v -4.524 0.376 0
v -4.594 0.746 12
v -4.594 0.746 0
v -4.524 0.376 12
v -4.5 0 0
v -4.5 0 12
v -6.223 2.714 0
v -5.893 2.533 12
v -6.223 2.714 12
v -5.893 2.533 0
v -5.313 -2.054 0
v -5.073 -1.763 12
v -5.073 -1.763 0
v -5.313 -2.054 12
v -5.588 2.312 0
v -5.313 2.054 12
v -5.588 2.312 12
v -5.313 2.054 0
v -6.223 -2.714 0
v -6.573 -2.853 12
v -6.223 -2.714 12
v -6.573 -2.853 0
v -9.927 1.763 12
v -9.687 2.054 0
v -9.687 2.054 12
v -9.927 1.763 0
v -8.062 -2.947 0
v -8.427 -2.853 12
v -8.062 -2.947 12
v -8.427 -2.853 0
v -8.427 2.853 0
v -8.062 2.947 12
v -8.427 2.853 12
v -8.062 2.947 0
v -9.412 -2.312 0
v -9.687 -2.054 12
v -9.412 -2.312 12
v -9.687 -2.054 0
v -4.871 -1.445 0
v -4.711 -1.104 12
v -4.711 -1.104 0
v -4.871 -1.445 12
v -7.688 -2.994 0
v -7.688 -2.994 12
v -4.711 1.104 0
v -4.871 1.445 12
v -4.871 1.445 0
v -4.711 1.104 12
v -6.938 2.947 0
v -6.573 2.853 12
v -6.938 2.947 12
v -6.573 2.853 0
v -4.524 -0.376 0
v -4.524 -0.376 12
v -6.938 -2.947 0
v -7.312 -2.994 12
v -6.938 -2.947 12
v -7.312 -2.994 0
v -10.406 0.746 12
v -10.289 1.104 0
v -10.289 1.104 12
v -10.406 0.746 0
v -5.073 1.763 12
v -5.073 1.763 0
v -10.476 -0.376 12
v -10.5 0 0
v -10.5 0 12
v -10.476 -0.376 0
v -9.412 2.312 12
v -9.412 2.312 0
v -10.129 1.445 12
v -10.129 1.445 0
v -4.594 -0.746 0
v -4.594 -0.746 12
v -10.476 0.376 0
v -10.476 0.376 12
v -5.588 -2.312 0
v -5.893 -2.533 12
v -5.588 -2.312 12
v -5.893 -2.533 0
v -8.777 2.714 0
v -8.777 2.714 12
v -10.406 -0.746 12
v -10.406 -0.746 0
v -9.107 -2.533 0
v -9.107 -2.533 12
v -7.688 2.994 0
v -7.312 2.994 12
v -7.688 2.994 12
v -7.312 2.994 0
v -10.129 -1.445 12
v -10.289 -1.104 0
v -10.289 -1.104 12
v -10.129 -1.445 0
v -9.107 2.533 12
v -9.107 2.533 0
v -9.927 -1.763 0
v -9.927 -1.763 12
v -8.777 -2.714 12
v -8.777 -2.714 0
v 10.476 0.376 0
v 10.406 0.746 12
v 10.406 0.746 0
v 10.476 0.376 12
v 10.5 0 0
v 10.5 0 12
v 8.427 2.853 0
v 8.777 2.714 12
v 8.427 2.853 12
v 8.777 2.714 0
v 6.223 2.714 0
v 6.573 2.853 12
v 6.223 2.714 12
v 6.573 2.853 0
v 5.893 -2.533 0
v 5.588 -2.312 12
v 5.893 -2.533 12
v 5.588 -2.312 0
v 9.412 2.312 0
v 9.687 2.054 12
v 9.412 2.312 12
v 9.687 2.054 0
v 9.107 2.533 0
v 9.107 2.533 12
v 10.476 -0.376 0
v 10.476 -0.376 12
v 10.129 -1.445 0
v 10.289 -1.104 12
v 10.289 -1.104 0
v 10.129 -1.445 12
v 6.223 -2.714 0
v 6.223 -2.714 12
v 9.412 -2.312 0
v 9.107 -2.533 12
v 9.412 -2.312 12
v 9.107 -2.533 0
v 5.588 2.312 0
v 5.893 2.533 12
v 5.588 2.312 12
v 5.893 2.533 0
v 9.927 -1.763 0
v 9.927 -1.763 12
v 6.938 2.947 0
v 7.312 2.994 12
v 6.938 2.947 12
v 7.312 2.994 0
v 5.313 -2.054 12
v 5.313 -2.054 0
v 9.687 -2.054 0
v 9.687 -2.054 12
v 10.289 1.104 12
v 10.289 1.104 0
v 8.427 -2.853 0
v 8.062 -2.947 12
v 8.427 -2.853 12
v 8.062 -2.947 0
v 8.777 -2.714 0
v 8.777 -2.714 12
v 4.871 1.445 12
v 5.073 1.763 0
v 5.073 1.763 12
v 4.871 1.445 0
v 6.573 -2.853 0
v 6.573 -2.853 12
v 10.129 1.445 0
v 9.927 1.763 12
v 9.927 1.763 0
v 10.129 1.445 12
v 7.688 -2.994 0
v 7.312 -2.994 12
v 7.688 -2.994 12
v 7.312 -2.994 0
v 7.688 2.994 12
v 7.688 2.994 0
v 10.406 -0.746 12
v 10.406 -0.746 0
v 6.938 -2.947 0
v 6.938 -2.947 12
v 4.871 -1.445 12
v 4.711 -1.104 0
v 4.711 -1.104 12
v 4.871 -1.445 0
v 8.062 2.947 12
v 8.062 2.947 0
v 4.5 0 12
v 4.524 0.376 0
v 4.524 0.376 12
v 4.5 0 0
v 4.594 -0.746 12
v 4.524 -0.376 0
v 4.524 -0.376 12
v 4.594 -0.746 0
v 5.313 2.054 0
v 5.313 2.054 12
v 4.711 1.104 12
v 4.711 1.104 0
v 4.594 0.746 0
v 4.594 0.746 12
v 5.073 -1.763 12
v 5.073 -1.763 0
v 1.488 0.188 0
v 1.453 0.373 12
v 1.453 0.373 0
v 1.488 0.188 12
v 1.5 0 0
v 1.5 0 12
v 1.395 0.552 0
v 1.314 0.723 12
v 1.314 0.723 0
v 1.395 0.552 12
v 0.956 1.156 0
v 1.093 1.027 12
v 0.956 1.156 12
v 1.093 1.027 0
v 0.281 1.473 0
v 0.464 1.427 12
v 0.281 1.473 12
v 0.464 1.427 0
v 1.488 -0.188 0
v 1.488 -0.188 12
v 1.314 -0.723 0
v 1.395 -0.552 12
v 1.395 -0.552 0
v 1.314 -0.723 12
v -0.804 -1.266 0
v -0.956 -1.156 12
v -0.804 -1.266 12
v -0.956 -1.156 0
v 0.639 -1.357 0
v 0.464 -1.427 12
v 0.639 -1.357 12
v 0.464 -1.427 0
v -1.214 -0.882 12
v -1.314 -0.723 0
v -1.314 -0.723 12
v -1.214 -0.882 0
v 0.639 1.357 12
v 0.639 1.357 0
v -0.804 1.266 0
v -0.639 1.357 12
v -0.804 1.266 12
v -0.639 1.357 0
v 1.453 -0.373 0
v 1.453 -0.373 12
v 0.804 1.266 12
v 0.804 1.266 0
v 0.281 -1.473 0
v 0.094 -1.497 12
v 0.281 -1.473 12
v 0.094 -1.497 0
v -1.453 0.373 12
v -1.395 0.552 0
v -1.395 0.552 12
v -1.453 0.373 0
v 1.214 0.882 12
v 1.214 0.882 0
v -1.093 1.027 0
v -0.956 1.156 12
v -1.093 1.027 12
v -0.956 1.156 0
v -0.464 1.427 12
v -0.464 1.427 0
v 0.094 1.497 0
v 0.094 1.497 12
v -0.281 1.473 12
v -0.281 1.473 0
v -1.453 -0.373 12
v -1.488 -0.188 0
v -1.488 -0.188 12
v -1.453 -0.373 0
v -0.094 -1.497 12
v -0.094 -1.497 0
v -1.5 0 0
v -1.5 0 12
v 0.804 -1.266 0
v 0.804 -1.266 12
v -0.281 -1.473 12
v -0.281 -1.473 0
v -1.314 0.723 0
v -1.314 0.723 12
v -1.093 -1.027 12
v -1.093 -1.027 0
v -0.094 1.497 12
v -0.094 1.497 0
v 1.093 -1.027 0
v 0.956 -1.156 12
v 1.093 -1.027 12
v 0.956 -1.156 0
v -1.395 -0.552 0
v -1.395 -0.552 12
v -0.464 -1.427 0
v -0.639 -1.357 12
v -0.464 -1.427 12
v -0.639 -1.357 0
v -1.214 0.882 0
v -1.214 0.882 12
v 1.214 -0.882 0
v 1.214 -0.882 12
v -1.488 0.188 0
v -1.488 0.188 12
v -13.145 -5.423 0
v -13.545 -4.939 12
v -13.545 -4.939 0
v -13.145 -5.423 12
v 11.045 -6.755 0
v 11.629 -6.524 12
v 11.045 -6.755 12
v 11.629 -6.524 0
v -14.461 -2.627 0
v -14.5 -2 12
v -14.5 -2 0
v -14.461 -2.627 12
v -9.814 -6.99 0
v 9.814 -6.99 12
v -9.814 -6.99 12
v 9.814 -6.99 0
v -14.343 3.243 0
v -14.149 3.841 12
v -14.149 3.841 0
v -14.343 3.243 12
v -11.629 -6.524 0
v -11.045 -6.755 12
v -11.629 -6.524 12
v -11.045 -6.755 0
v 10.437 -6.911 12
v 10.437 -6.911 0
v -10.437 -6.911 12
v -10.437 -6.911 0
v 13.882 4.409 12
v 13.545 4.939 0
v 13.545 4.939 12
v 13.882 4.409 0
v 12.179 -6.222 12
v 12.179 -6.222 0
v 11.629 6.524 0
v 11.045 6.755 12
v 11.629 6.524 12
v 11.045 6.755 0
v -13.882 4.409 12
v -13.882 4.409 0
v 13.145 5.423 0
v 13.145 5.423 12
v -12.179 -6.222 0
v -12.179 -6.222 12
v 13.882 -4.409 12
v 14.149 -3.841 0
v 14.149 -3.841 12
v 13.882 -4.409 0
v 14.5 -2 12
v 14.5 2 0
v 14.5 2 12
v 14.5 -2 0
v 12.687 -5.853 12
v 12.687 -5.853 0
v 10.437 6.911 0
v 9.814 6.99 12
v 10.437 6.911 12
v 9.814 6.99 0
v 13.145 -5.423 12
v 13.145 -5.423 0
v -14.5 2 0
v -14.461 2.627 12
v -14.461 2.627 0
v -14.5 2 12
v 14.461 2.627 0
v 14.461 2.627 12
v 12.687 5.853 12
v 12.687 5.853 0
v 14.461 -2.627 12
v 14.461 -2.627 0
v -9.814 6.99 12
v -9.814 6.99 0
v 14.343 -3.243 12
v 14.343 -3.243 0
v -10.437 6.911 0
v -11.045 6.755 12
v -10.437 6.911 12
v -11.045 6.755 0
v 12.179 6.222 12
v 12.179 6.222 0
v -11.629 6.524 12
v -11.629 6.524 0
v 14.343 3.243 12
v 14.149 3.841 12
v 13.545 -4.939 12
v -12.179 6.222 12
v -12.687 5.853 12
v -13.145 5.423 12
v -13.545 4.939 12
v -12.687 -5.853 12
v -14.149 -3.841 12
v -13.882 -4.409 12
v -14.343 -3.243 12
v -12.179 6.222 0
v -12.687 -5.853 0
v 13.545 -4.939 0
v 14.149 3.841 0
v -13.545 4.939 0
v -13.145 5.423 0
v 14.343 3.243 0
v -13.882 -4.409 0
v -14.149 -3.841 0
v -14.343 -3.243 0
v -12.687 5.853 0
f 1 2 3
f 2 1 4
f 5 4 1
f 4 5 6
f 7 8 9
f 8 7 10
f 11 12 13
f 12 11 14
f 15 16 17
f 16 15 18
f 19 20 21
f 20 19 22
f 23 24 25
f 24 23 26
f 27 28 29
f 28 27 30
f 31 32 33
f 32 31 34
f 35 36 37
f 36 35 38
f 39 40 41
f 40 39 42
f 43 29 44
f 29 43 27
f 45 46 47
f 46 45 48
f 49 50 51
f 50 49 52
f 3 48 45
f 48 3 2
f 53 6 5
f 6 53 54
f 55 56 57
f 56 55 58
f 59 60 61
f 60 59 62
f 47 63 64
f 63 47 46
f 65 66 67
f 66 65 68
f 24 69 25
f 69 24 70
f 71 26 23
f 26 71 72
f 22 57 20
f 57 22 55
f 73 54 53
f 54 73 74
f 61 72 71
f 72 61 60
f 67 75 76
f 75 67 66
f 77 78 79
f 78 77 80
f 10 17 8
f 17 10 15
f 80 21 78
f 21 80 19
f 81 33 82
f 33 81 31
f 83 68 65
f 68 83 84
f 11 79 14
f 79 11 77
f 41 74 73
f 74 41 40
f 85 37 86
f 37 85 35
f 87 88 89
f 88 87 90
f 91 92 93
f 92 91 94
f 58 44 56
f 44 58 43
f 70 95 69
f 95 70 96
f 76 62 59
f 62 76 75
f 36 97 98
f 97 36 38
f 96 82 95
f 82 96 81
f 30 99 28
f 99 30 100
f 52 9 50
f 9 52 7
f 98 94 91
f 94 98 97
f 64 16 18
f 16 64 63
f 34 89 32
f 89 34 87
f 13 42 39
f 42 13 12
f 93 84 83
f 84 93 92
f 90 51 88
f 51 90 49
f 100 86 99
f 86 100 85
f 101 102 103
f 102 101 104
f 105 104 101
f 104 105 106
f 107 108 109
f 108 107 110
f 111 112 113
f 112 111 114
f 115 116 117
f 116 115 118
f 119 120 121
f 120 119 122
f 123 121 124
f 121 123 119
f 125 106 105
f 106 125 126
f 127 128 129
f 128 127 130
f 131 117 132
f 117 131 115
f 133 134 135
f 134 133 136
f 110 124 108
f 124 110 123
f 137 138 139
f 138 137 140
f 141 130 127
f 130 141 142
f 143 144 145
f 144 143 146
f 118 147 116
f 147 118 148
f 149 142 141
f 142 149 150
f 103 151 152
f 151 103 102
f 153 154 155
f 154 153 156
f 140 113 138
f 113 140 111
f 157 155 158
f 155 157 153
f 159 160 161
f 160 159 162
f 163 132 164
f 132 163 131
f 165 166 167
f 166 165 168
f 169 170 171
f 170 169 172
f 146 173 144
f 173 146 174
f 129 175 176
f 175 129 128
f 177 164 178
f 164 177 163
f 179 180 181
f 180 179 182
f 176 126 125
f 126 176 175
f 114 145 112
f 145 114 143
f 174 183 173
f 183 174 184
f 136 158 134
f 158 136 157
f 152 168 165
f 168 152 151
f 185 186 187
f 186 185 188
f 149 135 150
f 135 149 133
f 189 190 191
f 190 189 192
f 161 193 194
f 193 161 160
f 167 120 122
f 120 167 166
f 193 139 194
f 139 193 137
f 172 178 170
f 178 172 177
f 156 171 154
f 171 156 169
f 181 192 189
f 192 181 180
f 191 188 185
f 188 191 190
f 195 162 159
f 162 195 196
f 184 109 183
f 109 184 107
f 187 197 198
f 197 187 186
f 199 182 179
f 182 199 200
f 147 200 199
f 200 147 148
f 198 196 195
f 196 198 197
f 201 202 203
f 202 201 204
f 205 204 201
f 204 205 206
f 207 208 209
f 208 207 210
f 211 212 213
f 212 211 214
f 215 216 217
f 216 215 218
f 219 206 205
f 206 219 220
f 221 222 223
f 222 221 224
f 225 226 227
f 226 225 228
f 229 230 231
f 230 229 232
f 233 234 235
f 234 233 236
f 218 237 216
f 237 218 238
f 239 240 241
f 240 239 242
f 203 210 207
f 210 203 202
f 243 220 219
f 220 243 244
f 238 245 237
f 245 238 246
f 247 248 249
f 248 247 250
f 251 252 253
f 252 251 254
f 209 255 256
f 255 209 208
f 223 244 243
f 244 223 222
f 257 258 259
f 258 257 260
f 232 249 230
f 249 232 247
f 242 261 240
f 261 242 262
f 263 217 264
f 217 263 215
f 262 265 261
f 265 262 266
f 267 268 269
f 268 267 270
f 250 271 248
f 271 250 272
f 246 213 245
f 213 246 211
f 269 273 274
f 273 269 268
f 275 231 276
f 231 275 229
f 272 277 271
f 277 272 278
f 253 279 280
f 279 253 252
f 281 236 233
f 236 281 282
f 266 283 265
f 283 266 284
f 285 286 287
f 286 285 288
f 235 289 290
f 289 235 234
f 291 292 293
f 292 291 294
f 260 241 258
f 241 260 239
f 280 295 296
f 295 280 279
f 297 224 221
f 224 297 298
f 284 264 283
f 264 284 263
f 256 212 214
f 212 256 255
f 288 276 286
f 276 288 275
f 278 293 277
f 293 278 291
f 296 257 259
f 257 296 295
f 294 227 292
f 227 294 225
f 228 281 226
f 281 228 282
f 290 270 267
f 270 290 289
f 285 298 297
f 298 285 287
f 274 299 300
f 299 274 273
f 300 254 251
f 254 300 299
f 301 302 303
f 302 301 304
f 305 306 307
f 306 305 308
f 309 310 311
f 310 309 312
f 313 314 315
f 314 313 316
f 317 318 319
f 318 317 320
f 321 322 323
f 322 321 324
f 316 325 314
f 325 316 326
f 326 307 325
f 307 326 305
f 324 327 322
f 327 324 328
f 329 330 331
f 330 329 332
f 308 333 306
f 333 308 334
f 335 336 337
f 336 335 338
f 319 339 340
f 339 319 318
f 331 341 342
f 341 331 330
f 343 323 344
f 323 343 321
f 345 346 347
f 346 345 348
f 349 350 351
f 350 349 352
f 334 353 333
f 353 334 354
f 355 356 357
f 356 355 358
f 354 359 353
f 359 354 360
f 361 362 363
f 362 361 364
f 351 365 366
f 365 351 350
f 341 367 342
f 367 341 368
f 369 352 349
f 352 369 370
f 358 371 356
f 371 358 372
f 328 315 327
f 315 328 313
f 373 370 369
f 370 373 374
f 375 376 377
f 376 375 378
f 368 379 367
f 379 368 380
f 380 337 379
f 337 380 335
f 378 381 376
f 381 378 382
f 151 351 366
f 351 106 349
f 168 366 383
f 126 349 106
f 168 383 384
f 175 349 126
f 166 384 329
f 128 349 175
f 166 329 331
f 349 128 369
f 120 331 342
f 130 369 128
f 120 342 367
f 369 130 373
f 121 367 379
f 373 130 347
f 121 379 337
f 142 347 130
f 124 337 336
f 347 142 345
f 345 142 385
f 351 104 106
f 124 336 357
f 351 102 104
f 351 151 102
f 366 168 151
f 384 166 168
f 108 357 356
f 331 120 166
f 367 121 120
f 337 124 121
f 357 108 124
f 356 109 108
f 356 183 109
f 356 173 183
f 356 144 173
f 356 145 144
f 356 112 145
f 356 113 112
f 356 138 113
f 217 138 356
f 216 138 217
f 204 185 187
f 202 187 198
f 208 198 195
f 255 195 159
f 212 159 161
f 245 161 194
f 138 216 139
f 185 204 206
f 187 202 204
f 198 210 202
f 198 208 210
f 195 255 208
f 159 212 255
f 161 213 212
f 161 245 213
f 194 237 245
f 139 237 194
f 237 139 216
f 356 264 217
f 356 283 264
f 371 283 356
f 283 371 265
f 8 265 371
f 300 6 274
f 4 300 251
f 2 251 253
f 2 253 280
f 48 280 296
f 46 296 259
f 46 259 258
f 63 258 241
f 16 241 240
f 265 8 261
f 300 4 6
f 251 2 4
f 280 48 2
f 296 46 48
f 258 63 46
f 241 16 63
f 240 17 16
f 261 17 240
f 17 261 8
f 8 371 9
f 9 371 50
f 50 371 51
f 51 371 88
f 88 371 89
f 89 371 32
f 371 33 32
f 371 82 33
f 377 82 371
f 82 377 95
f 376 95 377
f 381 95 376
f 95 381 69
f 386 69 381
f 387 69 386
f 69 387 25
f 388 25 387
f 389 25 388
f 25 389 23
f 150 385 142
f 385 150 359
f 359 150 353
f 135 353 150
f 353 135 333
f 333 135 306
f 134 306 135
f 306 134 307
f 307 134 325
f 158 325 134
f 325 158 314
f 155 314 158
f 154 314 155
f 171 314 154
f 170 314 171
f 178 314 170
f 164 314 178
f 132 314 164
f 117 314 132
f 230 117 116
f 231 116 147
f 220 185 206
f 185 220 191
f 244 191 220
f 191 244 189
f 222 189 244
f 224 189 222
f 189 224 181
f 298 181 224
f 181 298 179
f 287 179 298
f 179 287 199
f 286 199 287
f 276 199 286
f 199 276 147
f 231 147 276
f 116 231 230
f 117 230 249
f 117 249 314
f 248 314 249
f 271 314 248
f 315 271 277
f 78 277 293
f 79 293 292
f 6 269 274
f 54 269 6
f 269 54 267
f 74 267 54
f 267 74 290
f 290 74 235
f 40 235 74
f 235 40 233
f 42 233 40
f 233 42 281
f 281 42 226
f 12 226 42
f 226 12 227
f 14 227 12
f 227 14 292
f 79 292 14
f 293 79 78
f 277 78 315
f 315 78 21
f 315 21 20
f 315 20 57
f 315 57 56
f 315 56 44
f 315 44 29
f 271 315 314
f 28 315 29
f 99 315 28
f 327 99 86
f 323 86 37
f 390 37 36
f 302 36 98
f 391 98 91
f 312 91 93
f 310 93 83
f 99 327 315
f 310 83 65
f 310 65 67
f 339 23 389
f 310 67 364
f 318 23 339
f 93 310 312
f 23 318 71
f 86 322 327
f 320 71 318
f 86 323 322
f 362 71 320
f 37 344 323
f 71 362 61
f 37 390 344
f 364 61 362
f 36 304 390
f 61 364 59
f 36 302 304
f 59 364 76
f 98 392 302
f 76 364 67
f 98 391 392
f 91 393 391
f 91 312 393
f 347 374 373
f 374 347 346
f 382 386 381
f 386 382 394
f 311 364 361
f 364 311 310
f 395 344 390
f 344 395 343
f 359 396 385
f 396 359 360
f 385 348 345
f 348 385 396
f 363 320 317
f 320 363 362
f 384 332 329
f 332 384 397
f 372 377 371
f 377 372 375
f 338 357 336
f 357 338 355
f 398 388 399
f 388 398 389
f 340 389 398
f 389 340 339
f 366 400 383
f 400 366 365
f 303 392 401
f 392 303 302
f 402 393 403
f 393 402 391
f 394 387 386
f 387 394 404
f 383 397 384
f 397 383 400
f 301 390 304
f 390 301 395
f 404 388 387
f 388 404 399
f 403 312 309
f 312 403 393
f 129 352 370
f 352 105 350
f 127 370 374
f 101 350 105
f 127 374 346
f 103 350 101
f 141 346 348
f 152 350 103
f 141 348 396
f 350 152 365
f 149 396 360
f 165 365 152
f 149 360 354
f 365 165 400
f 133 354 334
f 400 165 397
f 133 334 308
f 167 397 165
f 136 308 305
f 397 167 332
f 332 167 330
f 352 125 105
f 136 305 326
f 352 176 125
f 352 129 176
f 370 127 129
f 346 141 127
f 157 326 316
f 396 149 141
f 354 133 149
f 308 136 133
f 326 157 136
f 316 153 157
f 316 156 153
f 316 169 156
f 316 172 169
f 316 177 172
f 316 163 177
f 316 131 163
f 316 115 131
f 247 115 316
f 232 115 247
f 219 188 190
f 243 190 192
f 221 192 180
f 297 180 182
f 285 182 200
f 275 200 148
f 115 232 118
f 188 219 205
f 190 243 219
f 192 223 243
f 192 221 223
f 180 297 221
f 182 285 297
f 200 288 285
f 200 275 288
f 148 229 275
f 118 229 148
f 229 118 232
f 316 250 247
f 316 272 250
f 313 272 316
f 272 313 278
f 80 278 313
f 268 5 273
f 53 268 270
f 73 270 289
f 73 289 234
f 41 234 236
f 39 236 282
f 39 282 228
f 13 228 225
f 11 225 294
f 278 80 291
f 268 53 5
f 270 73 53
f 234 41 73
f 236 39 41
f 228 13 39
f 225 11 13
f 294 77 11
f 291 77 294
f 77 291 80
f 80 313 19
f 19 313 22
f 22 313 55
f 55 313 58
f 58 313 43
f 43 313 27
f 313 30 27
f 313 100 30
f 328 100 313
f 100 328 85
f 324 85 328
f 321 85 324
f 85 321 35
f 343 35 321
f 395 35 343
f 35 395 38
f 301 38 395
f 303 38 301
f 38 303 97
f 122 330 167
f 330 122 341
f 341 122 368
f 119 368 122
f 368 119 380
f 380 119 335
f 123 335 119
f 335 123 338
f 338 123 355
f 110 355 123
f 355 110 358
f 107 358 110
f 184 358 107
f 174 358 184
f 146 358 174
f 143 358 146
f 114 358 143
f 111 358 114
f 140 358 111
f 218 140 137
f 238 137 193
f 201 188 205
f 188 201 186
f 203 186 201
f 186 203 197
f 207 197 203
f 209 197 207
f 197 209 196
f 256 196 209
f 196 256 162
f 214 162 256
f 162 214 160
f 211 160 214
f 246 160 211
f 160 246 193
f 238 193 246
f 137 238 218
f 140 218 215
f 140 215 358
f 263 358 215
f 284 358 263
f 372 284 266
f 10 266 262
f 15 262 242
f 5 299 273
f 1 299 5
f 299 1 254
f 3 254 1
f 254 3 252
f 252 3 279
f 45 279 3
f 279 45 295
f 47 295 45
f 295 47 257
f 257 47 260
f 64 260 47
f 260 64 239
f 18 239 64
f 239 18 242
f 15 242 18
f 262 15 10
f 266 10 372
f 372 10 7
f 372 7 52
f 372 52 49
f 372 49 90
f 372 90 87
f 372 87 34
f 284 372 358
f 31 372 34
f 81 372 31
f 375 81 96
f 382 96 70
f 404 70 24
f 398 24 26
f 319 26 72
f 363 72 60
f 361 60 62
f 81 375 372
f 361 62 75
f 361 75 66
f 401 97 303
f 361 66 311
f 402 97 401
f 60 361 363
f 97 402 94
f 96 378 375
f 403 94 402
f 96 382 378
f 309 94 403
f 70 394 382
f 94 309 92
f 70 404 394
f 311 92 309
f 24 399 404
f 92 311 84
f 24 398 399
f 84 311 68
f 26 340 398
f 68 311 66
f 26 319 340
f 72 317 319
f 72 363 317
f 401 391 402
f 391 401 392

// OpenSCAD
$fn = 50;


difference() {
	union() {
		*color(alpha = 1.0000000000, c = "gray") {
			translate(v = [0, 7, 0]) {
				linear_extrude(height = 1) {
					text(font = "Arial:style=Bold", halign = "center", size = 4.5000000000, text = "COMMENT plate main", valign = "center");
				}
			}
		}
		hull() {
			translate(v = [-9.5000000000, 2.0000000000, 0]) {
				cylinder(h = 12, r = 5);
			}
			translate(v = [9.5000000000, 2.0000000000, 0]) {
				cylinder(h = 12, r = 5);
			}
			translate(v = [-9.5000000000, -2.0000000000, 0]) {
				cylinder(h = 12, r = 5);
			}
			translate(v = [9.5000000000, -2.0000000000, 0]) {
				cylinder(h = 12, r = 5);
			}
		}
	}
	union() {
		*color(alpha = 1.0000000000, c = "gray") {
			translate(v = [0, 7, 0]) {
				linear_extrude(height = 1) {
					text(font = "Arial:style=Bold", halign = "center", size = 4.5000000000, text = "COMMENT holes main", valign = "center");
				}
			}
		}
		translate(v = [-7.5000000000, 0.0000000000, 0]) {
			translate(v = [0, 0, -100]) {
				cylinder(h = 200, r = 3.0000000000);
			}
		}
		translate(v = [7.5000000000, 0.0000000000, 0]) {
			translate(v = [0, 0, -100]) {
				cylinder(h = 200, r = 3.0000000000);
			}
		}
		translate(v = [-7.5000000000, 0.0000000000, 0]) {
			translate(v = [0, 0, -100]) {
				cylinder(h = 200, r = 1.5000000000);
			}
		}
		translate(v = [0, 0, -100]) {
			cylinder(h = 200, r = 1.5000000000);
		}
		translate(v = [7.5000000000, 0.0000000000, 0]) {
			translate(v = [0, 0, -100]) {
				cylinder(h = 200, r = 1.5000000000);
			}
		}
	}
}
